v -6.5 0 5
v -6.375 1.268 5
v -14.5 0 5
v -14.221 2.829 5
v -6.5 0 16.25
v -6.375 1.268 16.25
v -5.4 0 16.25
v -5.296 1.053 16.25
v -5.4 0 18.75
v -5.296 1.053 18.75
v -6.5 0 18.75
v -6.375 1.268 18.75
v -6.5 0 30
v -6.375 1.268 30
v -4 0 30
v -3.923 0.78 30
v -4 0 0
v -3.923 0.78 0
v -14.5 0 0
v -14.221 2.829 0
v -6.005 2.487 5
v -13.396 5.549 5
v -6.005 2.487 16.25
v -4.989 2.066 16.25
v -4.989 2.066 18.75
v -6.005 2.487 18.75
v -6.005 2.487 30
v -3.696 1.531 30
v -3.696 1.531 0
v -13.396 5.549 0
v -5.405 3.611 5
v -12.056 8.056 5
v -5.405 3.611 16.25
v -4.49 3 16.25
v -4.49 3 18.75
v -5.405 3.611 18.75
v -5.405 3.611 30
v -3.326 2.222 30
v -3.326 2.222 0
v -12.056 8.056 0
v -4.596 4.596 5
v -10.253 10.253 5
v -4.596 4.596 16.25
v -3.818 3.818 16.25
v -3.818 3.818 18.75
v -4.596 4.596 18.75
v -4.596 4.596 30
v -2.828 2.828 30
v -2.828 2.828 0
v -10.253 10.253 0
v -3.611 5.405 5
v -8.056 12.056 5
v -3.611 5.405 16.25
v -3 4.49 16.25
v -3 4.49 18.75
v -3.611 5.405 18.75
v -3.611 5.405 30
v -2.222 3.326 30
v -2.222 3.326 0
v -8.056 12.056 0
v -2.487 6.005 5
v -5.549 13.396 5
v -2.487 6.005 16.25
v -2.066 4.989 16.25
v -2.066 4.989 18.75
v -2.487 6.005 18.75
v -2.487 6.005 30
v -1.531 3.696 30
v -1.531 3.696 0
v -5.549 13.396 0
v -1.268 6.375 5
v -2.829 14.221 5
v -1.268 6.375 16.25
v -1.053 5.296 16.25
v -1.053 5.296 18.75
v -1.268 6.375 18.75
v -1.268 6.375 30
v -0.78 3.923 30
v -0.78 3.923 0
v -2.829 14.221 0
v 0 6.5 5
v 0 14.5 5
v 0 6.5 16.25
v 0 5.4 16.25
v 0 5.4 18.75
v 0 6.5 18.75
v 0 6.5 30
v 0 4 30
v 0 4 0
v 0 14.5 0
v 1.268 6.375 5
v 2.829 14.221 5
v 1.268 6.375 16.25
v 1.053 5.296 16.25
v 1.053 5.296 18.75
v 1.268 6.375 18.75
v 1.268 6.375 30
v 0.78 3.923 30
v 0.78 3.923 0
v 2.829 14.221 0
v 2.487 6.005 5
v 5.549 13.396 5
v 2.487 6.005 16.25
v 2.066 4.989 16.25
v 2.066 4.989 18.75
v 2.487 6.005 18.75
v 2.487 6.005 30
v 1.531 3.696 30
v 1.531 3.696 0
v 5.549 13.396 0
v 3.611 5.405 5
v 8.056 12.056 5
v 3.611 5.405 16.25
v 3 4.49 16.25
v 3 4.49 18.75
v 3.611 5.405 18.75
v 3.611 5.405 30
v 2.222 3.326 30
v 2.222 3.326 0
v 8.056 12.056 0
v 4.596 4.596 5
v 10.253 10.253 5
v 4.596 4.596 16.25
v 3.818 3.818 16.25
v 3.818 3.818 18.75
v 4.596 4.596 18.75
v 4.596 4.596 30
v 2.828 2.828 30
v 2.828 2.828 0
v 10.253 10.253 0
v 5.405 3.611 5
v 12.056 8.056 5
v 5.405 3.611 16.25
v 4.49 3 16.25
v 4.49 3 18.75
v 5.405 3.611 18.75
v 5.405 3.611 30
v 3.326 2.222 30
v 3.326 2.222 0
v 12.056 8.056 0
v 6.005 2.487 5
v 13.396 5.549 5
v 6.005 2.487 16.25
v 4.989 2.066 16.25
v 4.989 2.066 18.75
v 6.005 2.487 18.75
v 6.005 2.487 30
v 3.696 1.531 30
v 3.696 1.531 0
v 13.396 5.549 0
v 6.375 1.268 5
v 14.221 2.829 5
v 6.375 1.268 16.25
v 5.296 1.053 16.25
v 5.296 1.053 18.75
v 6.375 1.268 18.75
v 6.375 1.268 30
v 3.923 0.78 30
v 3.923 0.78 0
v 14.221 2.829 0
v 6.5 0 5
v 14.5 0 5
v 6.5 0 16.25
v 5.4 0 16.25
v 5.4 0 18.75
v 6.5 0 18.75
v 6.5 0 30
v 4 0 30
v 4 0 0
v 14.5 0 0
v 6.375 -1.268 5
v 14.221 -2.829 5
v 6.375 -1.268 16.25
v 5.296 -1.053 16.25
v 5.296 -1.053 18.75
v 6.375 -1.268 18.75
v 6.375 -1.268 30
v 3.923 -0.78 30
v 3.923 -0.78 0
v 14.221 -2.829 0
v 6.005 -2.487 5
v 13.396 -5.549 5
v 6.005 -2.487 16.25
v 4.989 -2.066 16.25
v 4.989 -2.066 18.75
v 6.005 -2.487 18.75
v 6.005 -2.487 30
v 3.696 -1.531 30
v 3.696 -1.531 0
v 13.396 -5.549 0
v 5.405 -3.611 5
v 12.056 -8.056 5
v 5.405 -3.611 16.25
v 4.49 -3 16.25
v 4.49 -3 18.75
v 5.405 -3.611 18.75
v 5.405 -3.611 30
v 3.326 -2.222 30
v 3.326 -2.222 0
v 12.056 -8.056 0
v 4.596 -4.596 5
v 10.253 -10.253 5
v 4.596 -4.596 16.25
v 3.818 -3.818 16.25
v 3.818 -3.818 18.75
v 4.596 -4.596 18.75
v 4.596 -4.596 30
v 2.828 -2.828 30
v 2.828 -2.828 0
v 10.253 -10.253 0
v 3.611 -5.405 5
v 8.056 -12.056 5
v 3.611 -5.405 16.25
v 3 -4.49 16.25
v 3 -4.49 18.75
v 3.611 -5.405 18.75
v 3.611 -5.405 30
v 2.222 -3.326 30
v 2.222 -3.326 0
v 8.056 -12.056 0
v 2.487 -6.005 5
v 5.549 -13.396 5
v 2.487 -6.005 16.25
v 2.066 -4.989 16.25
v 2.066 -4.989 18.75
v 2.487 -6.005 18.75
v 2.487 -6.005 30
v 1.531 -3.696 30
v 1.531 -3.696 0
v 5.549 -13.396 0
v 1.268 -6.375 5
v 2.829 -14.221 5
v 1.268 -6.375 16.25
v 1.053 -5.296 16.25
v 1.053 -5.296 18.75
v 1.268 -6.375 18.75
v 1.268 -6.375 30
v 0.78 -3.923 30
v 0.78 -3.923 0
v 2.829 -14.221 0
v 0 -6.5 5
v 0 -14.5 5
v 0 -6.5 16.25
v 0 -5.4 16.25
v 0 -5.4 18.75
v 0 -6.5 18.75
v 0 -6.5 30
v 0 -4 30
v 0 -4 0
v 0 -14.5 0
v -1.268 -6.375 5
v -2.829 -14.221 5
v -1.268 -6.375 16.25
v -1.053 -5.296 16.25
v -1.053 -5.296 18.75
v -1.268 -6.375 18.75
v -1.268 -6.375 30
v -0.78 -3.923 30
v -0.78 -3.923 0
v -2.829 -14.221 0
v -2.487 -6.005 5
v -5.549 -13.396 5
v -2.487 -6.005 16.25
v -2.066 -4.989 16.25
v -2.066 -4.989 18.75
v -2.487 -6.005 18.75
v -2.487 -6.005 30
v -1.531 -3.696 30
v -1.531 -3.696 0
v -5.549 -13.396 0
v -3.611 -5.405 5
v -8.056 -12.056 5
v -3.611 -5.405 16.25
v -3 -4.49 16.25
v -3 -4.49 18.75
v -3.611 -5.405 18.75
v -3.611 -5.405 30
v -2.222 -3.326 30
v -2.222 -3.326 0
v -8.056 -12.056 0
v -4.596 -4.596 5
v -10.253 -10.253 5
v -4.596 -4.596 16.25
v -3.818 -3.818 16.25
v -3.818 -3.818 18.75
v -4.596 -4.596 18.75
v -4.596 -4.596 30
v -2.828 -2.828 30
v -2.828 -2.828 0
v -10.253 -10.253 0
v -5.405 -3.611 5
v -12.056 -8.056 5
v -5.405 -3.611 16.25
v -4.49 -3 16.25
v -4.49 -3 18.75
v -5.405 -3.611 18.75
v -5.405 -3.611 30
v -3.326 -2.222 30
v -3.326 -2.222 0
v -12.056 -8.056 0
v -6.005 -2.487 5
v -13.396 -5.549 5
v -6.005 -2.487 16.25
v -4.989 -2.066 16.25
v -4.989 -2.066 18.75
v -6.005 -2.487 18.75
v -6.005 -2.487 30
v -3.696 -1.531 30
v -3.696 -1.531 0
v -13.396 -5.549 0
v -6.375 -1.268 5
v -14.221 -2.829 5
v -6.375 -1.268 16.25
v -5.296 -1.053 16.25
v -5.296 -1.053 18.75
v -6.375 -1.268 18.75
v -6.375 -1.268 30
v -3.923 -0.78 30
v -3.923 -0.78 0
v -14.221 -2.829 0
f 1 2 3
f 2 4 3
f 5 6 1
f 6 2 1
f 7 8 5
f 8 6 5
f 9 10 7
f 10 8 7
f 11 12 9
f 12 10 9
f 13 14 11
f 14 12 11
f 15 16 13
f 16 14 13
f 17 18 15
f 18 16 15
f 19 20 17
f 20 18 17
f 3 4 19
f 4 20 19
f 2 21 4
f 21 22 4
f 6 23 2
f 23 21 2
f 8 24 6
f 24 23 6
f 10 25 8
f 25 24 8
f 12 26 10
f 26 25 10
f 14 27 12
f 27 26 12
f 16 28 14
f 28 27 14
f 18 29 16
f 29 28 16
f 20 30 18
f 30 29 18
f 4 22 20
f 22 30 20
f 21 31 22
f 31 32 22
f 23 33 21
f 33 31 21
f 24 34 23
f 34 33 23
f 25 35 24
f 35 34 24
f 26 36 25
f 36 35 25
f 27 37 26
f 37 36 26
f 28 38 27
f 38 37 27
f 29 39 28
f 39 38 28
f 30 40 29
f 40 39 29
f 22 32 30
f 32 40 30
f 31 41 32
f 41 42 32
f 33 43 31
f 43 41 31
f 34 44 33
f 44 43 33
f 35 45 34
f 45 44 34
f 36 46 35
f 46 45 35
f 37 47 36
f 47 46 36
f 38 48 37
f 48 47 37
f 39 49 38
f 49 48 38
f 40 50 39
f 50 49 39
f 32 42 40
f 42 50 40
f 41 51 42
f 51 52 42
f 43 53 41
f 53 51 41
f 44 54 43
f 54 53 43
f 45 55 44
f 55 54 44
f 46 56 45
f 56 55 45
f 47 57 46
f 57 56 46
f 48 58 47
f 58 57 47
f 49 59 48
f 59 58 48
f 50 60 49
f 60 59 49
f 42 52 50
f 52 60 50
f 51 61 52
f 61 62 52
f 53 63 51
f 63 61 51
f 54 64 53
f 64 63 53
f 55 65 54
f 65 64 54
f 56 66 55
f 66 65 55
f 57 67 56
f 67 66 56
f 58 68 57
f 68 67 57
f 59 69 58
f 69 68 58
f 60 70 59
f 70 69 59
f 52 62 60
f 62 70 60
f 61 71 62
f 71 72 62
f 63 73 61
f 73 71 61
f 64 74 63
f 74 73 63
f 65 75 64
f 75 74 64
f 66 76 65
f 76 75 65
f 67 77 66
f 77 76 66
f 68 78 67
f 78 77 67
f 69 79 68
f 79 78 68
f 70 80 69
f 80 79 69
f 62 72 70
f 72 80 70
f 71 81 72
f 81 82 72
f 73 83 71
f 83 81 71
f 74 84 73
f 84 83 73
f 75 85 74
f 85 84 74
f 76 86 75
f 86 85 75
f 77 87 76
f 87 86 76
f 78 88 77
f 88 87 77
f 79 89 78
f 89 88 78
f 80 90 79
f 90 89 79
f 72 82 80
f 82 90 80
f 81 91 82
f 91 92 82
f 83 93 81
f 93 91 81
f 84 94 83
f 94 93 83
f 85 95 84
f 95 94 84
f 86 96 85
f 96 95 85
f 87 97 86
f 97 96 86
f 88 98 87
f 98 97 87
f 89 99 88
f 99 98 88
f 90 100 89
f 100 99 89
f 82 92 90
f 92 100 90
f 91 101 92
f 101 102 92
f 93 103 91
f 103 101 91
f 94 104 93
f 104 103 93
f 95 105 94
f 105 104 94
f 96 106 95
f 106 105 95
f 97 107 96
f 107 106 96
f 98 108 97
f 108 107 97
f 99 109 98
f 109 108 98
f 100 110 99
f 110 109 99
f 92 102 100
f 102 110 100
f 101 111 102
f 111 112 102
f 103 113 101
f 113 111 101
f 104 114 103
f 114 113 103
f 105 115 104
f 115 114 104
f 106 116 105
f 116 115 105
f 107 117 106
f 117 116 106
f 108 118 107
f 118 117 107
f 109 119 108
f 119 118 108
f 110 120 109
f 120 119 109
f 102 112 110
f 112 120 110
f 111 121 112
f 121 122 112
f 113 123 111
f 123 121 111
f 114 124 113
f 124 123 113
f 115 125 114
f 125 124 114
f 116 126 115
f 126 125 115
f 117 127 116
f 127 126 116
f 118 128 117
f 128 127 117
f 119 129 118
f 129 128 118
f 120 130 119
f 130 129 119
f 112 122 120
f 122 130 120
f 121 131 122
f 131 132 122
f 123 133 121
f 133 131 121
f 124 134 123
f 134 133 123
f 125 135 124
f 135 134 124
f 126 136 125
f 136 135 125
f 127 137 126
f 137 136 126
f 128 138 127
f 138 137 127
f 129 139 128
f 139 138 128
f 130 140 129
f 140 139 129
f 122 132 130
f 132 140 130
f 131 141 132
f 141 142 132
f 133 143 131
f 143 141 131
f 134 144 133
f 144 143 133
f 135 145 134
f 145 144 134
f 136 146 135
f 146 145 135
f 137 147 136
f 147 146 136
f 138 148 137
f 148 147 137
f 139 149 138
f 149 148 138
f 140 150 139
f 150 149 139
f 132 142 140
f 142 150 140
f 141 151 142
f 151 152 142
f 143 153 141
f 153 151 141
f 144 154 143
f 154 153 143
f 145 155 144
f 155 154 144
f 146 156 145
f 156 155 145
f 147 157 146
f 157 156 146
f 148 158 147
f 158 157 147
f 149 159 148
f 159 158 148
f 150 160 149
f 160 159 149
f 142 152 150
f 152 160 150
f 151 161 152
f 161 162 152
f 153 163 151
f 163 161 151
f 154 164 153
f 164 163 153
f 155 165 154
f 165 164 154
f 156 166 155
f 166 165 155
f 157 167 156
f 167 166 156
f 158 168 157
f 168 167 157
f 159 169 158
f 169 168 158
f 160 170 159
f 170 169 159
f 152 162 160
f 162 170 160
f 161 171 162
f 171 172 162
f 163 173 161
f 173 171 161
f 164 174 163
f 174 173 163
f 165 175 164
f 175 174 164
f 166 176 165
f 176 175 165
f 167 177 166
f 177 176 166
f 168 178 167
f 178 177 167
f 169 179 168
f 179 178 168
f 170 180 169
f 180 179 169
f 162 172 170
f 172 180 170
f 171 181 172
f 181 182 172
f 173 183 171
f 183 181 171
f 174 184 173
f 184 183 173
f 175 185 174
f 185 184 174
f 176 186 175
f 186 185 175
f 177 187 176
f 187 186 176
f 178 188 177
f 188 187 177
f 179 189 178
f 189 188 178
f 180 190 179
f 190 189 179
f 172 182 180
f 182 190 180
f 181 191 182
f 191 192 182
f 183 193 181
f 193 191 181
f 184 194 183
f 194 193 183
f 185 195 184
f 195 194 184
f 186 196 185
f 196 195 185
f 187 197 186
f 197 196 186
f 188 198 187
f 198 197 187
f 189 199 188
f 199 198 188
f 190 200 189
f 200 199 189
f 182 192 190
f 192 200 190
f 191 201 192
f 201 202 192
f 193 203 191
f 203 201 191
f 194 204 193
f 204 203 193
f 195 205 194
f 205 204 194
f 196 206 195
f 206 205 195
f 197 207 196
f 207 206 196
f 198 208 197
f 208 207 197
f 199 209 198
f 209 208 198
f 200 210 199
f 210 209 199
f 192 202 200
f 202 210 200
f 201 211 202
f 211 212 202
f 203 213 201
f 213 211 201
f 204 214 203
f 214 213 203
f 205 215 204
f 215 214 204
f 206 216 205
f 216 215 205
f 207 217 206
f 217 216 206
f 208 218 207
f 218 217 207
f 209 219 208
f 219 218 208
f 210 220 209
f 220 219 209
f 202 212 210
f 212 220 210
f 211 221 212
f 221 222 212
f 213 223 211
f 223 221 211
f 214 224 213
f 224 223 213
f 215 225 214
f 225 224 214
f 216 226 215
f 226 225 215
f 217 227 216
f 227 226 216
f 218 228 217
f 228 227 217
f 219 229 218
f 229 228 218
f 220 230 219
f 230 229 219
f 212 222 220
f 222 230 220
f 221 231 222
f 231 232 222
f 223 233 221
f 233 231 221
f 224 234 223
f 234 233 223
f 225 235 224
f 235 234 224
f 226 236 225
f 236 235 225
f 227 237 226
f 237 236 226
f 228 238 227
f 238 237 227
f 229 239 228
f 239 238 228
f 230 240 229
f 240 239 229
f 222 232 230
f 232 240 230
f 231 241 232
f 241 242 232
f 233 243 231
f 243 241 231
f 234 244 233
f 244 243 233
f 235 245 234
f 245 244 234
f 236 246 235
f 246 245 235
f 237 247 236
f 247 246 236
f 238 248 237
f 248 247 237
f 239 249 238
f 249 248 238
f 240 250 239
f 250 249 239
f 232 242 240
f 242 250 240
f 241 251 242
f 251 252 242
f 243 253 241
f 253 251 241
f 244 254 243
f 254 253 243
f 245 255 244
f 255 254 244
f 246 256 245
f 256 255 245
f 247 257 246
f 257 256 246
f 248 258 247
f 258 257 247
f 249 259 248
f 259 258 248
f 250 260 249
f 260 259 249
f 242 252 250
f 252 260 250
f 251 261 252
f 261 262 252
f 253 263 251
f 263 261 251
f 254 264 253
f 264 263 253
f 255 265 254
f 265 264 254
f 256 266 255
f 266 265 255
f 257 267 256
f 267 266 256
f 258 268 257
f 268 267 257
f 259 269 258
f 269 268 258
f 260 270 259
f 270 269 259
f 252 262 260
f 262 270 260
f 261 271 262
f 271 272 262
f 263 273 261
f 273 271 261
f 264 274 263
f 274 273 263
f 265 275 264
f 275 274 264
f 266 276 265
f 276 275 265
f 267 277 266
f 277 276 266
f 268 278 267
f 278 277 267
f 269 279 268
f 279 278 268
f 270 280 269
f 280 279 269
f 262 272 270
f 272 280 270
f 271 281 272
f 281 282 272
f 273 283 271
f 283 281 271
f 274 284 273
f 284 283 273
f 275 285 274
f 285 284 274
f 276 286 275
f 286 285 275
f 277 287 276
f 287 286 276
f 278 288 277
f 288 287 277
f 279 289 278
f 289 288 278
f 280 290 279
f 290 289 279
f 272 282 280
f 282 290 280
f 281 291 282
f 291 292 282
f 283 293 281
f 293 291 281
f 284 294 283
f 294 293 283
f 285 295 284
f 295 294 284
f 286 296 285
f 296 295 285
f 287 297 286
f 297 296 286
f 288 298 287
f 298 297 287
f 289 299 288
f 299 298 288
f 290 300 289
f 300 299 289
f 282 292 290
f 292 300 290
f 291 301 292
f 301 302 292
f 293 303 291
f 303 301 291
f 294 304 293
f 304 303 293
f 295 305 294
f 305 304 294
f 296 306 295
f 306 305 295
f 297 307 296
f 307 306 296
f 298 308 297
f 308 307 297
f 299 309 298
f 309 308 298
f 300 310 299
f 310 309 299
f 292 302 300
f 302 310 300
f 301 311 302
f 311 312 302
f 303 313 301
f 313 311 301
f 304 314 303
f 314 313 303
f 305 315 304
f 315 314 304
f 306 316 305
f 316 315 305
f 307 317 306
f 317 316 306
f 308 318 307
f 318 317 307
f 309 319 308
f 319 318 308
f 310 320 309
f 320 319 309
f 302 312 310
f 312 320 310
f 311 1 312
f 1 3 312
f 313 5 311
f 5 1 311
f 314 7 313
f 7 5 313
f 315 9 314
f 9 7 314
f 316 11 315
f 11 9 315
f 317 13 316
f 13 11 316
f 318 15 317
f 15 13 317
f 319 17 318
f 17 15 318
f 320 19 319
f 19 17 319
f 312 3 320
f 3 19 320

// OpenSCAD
$fn = 32;

// ----------------------------------------------------------------------
// Grooved revolve: flanged, bore R4
// ----------------------------------------------------------------------

// --- parameters (mm) ---
bore_r = 4;               // bore radius
outer_r = 6.5;            // outer radius of the body
total_h = 30;             // overall height, Z
wall = 2.5;               // radial wall thickness
groove_w = 2.5;           // groove width
groove_d = 1.1;           // groove depth
grooves = 1;              // number of outer grooves
flange_r = 14.5;          // flange radius
flange_h = 5;             // flange height

bbox_x = 2 * flange_r;  // full diameter
bore_d = 2 * bore_r;  // bore diameter
body_d = 2 * outer_r;  // body diameter
flange_d = 2 * flange_r;  // flange diameter
revolve_angle = 360;  // full turn around the Z axis

profile = [[4, 0], [6.5, 0], [14.5, 0], [14.5, 5], [6.5, 5], [6.5, 16.25], [5.4, 16.25], [5.4, 18.75], [6.5, 18.75], [6.5, 30], [4, 30]];  // primary outline, 11 points, counter clockwise

// --- the one profile operation ---
rotate_extrude(angle = revolve_angle) polygon(points = profile);
